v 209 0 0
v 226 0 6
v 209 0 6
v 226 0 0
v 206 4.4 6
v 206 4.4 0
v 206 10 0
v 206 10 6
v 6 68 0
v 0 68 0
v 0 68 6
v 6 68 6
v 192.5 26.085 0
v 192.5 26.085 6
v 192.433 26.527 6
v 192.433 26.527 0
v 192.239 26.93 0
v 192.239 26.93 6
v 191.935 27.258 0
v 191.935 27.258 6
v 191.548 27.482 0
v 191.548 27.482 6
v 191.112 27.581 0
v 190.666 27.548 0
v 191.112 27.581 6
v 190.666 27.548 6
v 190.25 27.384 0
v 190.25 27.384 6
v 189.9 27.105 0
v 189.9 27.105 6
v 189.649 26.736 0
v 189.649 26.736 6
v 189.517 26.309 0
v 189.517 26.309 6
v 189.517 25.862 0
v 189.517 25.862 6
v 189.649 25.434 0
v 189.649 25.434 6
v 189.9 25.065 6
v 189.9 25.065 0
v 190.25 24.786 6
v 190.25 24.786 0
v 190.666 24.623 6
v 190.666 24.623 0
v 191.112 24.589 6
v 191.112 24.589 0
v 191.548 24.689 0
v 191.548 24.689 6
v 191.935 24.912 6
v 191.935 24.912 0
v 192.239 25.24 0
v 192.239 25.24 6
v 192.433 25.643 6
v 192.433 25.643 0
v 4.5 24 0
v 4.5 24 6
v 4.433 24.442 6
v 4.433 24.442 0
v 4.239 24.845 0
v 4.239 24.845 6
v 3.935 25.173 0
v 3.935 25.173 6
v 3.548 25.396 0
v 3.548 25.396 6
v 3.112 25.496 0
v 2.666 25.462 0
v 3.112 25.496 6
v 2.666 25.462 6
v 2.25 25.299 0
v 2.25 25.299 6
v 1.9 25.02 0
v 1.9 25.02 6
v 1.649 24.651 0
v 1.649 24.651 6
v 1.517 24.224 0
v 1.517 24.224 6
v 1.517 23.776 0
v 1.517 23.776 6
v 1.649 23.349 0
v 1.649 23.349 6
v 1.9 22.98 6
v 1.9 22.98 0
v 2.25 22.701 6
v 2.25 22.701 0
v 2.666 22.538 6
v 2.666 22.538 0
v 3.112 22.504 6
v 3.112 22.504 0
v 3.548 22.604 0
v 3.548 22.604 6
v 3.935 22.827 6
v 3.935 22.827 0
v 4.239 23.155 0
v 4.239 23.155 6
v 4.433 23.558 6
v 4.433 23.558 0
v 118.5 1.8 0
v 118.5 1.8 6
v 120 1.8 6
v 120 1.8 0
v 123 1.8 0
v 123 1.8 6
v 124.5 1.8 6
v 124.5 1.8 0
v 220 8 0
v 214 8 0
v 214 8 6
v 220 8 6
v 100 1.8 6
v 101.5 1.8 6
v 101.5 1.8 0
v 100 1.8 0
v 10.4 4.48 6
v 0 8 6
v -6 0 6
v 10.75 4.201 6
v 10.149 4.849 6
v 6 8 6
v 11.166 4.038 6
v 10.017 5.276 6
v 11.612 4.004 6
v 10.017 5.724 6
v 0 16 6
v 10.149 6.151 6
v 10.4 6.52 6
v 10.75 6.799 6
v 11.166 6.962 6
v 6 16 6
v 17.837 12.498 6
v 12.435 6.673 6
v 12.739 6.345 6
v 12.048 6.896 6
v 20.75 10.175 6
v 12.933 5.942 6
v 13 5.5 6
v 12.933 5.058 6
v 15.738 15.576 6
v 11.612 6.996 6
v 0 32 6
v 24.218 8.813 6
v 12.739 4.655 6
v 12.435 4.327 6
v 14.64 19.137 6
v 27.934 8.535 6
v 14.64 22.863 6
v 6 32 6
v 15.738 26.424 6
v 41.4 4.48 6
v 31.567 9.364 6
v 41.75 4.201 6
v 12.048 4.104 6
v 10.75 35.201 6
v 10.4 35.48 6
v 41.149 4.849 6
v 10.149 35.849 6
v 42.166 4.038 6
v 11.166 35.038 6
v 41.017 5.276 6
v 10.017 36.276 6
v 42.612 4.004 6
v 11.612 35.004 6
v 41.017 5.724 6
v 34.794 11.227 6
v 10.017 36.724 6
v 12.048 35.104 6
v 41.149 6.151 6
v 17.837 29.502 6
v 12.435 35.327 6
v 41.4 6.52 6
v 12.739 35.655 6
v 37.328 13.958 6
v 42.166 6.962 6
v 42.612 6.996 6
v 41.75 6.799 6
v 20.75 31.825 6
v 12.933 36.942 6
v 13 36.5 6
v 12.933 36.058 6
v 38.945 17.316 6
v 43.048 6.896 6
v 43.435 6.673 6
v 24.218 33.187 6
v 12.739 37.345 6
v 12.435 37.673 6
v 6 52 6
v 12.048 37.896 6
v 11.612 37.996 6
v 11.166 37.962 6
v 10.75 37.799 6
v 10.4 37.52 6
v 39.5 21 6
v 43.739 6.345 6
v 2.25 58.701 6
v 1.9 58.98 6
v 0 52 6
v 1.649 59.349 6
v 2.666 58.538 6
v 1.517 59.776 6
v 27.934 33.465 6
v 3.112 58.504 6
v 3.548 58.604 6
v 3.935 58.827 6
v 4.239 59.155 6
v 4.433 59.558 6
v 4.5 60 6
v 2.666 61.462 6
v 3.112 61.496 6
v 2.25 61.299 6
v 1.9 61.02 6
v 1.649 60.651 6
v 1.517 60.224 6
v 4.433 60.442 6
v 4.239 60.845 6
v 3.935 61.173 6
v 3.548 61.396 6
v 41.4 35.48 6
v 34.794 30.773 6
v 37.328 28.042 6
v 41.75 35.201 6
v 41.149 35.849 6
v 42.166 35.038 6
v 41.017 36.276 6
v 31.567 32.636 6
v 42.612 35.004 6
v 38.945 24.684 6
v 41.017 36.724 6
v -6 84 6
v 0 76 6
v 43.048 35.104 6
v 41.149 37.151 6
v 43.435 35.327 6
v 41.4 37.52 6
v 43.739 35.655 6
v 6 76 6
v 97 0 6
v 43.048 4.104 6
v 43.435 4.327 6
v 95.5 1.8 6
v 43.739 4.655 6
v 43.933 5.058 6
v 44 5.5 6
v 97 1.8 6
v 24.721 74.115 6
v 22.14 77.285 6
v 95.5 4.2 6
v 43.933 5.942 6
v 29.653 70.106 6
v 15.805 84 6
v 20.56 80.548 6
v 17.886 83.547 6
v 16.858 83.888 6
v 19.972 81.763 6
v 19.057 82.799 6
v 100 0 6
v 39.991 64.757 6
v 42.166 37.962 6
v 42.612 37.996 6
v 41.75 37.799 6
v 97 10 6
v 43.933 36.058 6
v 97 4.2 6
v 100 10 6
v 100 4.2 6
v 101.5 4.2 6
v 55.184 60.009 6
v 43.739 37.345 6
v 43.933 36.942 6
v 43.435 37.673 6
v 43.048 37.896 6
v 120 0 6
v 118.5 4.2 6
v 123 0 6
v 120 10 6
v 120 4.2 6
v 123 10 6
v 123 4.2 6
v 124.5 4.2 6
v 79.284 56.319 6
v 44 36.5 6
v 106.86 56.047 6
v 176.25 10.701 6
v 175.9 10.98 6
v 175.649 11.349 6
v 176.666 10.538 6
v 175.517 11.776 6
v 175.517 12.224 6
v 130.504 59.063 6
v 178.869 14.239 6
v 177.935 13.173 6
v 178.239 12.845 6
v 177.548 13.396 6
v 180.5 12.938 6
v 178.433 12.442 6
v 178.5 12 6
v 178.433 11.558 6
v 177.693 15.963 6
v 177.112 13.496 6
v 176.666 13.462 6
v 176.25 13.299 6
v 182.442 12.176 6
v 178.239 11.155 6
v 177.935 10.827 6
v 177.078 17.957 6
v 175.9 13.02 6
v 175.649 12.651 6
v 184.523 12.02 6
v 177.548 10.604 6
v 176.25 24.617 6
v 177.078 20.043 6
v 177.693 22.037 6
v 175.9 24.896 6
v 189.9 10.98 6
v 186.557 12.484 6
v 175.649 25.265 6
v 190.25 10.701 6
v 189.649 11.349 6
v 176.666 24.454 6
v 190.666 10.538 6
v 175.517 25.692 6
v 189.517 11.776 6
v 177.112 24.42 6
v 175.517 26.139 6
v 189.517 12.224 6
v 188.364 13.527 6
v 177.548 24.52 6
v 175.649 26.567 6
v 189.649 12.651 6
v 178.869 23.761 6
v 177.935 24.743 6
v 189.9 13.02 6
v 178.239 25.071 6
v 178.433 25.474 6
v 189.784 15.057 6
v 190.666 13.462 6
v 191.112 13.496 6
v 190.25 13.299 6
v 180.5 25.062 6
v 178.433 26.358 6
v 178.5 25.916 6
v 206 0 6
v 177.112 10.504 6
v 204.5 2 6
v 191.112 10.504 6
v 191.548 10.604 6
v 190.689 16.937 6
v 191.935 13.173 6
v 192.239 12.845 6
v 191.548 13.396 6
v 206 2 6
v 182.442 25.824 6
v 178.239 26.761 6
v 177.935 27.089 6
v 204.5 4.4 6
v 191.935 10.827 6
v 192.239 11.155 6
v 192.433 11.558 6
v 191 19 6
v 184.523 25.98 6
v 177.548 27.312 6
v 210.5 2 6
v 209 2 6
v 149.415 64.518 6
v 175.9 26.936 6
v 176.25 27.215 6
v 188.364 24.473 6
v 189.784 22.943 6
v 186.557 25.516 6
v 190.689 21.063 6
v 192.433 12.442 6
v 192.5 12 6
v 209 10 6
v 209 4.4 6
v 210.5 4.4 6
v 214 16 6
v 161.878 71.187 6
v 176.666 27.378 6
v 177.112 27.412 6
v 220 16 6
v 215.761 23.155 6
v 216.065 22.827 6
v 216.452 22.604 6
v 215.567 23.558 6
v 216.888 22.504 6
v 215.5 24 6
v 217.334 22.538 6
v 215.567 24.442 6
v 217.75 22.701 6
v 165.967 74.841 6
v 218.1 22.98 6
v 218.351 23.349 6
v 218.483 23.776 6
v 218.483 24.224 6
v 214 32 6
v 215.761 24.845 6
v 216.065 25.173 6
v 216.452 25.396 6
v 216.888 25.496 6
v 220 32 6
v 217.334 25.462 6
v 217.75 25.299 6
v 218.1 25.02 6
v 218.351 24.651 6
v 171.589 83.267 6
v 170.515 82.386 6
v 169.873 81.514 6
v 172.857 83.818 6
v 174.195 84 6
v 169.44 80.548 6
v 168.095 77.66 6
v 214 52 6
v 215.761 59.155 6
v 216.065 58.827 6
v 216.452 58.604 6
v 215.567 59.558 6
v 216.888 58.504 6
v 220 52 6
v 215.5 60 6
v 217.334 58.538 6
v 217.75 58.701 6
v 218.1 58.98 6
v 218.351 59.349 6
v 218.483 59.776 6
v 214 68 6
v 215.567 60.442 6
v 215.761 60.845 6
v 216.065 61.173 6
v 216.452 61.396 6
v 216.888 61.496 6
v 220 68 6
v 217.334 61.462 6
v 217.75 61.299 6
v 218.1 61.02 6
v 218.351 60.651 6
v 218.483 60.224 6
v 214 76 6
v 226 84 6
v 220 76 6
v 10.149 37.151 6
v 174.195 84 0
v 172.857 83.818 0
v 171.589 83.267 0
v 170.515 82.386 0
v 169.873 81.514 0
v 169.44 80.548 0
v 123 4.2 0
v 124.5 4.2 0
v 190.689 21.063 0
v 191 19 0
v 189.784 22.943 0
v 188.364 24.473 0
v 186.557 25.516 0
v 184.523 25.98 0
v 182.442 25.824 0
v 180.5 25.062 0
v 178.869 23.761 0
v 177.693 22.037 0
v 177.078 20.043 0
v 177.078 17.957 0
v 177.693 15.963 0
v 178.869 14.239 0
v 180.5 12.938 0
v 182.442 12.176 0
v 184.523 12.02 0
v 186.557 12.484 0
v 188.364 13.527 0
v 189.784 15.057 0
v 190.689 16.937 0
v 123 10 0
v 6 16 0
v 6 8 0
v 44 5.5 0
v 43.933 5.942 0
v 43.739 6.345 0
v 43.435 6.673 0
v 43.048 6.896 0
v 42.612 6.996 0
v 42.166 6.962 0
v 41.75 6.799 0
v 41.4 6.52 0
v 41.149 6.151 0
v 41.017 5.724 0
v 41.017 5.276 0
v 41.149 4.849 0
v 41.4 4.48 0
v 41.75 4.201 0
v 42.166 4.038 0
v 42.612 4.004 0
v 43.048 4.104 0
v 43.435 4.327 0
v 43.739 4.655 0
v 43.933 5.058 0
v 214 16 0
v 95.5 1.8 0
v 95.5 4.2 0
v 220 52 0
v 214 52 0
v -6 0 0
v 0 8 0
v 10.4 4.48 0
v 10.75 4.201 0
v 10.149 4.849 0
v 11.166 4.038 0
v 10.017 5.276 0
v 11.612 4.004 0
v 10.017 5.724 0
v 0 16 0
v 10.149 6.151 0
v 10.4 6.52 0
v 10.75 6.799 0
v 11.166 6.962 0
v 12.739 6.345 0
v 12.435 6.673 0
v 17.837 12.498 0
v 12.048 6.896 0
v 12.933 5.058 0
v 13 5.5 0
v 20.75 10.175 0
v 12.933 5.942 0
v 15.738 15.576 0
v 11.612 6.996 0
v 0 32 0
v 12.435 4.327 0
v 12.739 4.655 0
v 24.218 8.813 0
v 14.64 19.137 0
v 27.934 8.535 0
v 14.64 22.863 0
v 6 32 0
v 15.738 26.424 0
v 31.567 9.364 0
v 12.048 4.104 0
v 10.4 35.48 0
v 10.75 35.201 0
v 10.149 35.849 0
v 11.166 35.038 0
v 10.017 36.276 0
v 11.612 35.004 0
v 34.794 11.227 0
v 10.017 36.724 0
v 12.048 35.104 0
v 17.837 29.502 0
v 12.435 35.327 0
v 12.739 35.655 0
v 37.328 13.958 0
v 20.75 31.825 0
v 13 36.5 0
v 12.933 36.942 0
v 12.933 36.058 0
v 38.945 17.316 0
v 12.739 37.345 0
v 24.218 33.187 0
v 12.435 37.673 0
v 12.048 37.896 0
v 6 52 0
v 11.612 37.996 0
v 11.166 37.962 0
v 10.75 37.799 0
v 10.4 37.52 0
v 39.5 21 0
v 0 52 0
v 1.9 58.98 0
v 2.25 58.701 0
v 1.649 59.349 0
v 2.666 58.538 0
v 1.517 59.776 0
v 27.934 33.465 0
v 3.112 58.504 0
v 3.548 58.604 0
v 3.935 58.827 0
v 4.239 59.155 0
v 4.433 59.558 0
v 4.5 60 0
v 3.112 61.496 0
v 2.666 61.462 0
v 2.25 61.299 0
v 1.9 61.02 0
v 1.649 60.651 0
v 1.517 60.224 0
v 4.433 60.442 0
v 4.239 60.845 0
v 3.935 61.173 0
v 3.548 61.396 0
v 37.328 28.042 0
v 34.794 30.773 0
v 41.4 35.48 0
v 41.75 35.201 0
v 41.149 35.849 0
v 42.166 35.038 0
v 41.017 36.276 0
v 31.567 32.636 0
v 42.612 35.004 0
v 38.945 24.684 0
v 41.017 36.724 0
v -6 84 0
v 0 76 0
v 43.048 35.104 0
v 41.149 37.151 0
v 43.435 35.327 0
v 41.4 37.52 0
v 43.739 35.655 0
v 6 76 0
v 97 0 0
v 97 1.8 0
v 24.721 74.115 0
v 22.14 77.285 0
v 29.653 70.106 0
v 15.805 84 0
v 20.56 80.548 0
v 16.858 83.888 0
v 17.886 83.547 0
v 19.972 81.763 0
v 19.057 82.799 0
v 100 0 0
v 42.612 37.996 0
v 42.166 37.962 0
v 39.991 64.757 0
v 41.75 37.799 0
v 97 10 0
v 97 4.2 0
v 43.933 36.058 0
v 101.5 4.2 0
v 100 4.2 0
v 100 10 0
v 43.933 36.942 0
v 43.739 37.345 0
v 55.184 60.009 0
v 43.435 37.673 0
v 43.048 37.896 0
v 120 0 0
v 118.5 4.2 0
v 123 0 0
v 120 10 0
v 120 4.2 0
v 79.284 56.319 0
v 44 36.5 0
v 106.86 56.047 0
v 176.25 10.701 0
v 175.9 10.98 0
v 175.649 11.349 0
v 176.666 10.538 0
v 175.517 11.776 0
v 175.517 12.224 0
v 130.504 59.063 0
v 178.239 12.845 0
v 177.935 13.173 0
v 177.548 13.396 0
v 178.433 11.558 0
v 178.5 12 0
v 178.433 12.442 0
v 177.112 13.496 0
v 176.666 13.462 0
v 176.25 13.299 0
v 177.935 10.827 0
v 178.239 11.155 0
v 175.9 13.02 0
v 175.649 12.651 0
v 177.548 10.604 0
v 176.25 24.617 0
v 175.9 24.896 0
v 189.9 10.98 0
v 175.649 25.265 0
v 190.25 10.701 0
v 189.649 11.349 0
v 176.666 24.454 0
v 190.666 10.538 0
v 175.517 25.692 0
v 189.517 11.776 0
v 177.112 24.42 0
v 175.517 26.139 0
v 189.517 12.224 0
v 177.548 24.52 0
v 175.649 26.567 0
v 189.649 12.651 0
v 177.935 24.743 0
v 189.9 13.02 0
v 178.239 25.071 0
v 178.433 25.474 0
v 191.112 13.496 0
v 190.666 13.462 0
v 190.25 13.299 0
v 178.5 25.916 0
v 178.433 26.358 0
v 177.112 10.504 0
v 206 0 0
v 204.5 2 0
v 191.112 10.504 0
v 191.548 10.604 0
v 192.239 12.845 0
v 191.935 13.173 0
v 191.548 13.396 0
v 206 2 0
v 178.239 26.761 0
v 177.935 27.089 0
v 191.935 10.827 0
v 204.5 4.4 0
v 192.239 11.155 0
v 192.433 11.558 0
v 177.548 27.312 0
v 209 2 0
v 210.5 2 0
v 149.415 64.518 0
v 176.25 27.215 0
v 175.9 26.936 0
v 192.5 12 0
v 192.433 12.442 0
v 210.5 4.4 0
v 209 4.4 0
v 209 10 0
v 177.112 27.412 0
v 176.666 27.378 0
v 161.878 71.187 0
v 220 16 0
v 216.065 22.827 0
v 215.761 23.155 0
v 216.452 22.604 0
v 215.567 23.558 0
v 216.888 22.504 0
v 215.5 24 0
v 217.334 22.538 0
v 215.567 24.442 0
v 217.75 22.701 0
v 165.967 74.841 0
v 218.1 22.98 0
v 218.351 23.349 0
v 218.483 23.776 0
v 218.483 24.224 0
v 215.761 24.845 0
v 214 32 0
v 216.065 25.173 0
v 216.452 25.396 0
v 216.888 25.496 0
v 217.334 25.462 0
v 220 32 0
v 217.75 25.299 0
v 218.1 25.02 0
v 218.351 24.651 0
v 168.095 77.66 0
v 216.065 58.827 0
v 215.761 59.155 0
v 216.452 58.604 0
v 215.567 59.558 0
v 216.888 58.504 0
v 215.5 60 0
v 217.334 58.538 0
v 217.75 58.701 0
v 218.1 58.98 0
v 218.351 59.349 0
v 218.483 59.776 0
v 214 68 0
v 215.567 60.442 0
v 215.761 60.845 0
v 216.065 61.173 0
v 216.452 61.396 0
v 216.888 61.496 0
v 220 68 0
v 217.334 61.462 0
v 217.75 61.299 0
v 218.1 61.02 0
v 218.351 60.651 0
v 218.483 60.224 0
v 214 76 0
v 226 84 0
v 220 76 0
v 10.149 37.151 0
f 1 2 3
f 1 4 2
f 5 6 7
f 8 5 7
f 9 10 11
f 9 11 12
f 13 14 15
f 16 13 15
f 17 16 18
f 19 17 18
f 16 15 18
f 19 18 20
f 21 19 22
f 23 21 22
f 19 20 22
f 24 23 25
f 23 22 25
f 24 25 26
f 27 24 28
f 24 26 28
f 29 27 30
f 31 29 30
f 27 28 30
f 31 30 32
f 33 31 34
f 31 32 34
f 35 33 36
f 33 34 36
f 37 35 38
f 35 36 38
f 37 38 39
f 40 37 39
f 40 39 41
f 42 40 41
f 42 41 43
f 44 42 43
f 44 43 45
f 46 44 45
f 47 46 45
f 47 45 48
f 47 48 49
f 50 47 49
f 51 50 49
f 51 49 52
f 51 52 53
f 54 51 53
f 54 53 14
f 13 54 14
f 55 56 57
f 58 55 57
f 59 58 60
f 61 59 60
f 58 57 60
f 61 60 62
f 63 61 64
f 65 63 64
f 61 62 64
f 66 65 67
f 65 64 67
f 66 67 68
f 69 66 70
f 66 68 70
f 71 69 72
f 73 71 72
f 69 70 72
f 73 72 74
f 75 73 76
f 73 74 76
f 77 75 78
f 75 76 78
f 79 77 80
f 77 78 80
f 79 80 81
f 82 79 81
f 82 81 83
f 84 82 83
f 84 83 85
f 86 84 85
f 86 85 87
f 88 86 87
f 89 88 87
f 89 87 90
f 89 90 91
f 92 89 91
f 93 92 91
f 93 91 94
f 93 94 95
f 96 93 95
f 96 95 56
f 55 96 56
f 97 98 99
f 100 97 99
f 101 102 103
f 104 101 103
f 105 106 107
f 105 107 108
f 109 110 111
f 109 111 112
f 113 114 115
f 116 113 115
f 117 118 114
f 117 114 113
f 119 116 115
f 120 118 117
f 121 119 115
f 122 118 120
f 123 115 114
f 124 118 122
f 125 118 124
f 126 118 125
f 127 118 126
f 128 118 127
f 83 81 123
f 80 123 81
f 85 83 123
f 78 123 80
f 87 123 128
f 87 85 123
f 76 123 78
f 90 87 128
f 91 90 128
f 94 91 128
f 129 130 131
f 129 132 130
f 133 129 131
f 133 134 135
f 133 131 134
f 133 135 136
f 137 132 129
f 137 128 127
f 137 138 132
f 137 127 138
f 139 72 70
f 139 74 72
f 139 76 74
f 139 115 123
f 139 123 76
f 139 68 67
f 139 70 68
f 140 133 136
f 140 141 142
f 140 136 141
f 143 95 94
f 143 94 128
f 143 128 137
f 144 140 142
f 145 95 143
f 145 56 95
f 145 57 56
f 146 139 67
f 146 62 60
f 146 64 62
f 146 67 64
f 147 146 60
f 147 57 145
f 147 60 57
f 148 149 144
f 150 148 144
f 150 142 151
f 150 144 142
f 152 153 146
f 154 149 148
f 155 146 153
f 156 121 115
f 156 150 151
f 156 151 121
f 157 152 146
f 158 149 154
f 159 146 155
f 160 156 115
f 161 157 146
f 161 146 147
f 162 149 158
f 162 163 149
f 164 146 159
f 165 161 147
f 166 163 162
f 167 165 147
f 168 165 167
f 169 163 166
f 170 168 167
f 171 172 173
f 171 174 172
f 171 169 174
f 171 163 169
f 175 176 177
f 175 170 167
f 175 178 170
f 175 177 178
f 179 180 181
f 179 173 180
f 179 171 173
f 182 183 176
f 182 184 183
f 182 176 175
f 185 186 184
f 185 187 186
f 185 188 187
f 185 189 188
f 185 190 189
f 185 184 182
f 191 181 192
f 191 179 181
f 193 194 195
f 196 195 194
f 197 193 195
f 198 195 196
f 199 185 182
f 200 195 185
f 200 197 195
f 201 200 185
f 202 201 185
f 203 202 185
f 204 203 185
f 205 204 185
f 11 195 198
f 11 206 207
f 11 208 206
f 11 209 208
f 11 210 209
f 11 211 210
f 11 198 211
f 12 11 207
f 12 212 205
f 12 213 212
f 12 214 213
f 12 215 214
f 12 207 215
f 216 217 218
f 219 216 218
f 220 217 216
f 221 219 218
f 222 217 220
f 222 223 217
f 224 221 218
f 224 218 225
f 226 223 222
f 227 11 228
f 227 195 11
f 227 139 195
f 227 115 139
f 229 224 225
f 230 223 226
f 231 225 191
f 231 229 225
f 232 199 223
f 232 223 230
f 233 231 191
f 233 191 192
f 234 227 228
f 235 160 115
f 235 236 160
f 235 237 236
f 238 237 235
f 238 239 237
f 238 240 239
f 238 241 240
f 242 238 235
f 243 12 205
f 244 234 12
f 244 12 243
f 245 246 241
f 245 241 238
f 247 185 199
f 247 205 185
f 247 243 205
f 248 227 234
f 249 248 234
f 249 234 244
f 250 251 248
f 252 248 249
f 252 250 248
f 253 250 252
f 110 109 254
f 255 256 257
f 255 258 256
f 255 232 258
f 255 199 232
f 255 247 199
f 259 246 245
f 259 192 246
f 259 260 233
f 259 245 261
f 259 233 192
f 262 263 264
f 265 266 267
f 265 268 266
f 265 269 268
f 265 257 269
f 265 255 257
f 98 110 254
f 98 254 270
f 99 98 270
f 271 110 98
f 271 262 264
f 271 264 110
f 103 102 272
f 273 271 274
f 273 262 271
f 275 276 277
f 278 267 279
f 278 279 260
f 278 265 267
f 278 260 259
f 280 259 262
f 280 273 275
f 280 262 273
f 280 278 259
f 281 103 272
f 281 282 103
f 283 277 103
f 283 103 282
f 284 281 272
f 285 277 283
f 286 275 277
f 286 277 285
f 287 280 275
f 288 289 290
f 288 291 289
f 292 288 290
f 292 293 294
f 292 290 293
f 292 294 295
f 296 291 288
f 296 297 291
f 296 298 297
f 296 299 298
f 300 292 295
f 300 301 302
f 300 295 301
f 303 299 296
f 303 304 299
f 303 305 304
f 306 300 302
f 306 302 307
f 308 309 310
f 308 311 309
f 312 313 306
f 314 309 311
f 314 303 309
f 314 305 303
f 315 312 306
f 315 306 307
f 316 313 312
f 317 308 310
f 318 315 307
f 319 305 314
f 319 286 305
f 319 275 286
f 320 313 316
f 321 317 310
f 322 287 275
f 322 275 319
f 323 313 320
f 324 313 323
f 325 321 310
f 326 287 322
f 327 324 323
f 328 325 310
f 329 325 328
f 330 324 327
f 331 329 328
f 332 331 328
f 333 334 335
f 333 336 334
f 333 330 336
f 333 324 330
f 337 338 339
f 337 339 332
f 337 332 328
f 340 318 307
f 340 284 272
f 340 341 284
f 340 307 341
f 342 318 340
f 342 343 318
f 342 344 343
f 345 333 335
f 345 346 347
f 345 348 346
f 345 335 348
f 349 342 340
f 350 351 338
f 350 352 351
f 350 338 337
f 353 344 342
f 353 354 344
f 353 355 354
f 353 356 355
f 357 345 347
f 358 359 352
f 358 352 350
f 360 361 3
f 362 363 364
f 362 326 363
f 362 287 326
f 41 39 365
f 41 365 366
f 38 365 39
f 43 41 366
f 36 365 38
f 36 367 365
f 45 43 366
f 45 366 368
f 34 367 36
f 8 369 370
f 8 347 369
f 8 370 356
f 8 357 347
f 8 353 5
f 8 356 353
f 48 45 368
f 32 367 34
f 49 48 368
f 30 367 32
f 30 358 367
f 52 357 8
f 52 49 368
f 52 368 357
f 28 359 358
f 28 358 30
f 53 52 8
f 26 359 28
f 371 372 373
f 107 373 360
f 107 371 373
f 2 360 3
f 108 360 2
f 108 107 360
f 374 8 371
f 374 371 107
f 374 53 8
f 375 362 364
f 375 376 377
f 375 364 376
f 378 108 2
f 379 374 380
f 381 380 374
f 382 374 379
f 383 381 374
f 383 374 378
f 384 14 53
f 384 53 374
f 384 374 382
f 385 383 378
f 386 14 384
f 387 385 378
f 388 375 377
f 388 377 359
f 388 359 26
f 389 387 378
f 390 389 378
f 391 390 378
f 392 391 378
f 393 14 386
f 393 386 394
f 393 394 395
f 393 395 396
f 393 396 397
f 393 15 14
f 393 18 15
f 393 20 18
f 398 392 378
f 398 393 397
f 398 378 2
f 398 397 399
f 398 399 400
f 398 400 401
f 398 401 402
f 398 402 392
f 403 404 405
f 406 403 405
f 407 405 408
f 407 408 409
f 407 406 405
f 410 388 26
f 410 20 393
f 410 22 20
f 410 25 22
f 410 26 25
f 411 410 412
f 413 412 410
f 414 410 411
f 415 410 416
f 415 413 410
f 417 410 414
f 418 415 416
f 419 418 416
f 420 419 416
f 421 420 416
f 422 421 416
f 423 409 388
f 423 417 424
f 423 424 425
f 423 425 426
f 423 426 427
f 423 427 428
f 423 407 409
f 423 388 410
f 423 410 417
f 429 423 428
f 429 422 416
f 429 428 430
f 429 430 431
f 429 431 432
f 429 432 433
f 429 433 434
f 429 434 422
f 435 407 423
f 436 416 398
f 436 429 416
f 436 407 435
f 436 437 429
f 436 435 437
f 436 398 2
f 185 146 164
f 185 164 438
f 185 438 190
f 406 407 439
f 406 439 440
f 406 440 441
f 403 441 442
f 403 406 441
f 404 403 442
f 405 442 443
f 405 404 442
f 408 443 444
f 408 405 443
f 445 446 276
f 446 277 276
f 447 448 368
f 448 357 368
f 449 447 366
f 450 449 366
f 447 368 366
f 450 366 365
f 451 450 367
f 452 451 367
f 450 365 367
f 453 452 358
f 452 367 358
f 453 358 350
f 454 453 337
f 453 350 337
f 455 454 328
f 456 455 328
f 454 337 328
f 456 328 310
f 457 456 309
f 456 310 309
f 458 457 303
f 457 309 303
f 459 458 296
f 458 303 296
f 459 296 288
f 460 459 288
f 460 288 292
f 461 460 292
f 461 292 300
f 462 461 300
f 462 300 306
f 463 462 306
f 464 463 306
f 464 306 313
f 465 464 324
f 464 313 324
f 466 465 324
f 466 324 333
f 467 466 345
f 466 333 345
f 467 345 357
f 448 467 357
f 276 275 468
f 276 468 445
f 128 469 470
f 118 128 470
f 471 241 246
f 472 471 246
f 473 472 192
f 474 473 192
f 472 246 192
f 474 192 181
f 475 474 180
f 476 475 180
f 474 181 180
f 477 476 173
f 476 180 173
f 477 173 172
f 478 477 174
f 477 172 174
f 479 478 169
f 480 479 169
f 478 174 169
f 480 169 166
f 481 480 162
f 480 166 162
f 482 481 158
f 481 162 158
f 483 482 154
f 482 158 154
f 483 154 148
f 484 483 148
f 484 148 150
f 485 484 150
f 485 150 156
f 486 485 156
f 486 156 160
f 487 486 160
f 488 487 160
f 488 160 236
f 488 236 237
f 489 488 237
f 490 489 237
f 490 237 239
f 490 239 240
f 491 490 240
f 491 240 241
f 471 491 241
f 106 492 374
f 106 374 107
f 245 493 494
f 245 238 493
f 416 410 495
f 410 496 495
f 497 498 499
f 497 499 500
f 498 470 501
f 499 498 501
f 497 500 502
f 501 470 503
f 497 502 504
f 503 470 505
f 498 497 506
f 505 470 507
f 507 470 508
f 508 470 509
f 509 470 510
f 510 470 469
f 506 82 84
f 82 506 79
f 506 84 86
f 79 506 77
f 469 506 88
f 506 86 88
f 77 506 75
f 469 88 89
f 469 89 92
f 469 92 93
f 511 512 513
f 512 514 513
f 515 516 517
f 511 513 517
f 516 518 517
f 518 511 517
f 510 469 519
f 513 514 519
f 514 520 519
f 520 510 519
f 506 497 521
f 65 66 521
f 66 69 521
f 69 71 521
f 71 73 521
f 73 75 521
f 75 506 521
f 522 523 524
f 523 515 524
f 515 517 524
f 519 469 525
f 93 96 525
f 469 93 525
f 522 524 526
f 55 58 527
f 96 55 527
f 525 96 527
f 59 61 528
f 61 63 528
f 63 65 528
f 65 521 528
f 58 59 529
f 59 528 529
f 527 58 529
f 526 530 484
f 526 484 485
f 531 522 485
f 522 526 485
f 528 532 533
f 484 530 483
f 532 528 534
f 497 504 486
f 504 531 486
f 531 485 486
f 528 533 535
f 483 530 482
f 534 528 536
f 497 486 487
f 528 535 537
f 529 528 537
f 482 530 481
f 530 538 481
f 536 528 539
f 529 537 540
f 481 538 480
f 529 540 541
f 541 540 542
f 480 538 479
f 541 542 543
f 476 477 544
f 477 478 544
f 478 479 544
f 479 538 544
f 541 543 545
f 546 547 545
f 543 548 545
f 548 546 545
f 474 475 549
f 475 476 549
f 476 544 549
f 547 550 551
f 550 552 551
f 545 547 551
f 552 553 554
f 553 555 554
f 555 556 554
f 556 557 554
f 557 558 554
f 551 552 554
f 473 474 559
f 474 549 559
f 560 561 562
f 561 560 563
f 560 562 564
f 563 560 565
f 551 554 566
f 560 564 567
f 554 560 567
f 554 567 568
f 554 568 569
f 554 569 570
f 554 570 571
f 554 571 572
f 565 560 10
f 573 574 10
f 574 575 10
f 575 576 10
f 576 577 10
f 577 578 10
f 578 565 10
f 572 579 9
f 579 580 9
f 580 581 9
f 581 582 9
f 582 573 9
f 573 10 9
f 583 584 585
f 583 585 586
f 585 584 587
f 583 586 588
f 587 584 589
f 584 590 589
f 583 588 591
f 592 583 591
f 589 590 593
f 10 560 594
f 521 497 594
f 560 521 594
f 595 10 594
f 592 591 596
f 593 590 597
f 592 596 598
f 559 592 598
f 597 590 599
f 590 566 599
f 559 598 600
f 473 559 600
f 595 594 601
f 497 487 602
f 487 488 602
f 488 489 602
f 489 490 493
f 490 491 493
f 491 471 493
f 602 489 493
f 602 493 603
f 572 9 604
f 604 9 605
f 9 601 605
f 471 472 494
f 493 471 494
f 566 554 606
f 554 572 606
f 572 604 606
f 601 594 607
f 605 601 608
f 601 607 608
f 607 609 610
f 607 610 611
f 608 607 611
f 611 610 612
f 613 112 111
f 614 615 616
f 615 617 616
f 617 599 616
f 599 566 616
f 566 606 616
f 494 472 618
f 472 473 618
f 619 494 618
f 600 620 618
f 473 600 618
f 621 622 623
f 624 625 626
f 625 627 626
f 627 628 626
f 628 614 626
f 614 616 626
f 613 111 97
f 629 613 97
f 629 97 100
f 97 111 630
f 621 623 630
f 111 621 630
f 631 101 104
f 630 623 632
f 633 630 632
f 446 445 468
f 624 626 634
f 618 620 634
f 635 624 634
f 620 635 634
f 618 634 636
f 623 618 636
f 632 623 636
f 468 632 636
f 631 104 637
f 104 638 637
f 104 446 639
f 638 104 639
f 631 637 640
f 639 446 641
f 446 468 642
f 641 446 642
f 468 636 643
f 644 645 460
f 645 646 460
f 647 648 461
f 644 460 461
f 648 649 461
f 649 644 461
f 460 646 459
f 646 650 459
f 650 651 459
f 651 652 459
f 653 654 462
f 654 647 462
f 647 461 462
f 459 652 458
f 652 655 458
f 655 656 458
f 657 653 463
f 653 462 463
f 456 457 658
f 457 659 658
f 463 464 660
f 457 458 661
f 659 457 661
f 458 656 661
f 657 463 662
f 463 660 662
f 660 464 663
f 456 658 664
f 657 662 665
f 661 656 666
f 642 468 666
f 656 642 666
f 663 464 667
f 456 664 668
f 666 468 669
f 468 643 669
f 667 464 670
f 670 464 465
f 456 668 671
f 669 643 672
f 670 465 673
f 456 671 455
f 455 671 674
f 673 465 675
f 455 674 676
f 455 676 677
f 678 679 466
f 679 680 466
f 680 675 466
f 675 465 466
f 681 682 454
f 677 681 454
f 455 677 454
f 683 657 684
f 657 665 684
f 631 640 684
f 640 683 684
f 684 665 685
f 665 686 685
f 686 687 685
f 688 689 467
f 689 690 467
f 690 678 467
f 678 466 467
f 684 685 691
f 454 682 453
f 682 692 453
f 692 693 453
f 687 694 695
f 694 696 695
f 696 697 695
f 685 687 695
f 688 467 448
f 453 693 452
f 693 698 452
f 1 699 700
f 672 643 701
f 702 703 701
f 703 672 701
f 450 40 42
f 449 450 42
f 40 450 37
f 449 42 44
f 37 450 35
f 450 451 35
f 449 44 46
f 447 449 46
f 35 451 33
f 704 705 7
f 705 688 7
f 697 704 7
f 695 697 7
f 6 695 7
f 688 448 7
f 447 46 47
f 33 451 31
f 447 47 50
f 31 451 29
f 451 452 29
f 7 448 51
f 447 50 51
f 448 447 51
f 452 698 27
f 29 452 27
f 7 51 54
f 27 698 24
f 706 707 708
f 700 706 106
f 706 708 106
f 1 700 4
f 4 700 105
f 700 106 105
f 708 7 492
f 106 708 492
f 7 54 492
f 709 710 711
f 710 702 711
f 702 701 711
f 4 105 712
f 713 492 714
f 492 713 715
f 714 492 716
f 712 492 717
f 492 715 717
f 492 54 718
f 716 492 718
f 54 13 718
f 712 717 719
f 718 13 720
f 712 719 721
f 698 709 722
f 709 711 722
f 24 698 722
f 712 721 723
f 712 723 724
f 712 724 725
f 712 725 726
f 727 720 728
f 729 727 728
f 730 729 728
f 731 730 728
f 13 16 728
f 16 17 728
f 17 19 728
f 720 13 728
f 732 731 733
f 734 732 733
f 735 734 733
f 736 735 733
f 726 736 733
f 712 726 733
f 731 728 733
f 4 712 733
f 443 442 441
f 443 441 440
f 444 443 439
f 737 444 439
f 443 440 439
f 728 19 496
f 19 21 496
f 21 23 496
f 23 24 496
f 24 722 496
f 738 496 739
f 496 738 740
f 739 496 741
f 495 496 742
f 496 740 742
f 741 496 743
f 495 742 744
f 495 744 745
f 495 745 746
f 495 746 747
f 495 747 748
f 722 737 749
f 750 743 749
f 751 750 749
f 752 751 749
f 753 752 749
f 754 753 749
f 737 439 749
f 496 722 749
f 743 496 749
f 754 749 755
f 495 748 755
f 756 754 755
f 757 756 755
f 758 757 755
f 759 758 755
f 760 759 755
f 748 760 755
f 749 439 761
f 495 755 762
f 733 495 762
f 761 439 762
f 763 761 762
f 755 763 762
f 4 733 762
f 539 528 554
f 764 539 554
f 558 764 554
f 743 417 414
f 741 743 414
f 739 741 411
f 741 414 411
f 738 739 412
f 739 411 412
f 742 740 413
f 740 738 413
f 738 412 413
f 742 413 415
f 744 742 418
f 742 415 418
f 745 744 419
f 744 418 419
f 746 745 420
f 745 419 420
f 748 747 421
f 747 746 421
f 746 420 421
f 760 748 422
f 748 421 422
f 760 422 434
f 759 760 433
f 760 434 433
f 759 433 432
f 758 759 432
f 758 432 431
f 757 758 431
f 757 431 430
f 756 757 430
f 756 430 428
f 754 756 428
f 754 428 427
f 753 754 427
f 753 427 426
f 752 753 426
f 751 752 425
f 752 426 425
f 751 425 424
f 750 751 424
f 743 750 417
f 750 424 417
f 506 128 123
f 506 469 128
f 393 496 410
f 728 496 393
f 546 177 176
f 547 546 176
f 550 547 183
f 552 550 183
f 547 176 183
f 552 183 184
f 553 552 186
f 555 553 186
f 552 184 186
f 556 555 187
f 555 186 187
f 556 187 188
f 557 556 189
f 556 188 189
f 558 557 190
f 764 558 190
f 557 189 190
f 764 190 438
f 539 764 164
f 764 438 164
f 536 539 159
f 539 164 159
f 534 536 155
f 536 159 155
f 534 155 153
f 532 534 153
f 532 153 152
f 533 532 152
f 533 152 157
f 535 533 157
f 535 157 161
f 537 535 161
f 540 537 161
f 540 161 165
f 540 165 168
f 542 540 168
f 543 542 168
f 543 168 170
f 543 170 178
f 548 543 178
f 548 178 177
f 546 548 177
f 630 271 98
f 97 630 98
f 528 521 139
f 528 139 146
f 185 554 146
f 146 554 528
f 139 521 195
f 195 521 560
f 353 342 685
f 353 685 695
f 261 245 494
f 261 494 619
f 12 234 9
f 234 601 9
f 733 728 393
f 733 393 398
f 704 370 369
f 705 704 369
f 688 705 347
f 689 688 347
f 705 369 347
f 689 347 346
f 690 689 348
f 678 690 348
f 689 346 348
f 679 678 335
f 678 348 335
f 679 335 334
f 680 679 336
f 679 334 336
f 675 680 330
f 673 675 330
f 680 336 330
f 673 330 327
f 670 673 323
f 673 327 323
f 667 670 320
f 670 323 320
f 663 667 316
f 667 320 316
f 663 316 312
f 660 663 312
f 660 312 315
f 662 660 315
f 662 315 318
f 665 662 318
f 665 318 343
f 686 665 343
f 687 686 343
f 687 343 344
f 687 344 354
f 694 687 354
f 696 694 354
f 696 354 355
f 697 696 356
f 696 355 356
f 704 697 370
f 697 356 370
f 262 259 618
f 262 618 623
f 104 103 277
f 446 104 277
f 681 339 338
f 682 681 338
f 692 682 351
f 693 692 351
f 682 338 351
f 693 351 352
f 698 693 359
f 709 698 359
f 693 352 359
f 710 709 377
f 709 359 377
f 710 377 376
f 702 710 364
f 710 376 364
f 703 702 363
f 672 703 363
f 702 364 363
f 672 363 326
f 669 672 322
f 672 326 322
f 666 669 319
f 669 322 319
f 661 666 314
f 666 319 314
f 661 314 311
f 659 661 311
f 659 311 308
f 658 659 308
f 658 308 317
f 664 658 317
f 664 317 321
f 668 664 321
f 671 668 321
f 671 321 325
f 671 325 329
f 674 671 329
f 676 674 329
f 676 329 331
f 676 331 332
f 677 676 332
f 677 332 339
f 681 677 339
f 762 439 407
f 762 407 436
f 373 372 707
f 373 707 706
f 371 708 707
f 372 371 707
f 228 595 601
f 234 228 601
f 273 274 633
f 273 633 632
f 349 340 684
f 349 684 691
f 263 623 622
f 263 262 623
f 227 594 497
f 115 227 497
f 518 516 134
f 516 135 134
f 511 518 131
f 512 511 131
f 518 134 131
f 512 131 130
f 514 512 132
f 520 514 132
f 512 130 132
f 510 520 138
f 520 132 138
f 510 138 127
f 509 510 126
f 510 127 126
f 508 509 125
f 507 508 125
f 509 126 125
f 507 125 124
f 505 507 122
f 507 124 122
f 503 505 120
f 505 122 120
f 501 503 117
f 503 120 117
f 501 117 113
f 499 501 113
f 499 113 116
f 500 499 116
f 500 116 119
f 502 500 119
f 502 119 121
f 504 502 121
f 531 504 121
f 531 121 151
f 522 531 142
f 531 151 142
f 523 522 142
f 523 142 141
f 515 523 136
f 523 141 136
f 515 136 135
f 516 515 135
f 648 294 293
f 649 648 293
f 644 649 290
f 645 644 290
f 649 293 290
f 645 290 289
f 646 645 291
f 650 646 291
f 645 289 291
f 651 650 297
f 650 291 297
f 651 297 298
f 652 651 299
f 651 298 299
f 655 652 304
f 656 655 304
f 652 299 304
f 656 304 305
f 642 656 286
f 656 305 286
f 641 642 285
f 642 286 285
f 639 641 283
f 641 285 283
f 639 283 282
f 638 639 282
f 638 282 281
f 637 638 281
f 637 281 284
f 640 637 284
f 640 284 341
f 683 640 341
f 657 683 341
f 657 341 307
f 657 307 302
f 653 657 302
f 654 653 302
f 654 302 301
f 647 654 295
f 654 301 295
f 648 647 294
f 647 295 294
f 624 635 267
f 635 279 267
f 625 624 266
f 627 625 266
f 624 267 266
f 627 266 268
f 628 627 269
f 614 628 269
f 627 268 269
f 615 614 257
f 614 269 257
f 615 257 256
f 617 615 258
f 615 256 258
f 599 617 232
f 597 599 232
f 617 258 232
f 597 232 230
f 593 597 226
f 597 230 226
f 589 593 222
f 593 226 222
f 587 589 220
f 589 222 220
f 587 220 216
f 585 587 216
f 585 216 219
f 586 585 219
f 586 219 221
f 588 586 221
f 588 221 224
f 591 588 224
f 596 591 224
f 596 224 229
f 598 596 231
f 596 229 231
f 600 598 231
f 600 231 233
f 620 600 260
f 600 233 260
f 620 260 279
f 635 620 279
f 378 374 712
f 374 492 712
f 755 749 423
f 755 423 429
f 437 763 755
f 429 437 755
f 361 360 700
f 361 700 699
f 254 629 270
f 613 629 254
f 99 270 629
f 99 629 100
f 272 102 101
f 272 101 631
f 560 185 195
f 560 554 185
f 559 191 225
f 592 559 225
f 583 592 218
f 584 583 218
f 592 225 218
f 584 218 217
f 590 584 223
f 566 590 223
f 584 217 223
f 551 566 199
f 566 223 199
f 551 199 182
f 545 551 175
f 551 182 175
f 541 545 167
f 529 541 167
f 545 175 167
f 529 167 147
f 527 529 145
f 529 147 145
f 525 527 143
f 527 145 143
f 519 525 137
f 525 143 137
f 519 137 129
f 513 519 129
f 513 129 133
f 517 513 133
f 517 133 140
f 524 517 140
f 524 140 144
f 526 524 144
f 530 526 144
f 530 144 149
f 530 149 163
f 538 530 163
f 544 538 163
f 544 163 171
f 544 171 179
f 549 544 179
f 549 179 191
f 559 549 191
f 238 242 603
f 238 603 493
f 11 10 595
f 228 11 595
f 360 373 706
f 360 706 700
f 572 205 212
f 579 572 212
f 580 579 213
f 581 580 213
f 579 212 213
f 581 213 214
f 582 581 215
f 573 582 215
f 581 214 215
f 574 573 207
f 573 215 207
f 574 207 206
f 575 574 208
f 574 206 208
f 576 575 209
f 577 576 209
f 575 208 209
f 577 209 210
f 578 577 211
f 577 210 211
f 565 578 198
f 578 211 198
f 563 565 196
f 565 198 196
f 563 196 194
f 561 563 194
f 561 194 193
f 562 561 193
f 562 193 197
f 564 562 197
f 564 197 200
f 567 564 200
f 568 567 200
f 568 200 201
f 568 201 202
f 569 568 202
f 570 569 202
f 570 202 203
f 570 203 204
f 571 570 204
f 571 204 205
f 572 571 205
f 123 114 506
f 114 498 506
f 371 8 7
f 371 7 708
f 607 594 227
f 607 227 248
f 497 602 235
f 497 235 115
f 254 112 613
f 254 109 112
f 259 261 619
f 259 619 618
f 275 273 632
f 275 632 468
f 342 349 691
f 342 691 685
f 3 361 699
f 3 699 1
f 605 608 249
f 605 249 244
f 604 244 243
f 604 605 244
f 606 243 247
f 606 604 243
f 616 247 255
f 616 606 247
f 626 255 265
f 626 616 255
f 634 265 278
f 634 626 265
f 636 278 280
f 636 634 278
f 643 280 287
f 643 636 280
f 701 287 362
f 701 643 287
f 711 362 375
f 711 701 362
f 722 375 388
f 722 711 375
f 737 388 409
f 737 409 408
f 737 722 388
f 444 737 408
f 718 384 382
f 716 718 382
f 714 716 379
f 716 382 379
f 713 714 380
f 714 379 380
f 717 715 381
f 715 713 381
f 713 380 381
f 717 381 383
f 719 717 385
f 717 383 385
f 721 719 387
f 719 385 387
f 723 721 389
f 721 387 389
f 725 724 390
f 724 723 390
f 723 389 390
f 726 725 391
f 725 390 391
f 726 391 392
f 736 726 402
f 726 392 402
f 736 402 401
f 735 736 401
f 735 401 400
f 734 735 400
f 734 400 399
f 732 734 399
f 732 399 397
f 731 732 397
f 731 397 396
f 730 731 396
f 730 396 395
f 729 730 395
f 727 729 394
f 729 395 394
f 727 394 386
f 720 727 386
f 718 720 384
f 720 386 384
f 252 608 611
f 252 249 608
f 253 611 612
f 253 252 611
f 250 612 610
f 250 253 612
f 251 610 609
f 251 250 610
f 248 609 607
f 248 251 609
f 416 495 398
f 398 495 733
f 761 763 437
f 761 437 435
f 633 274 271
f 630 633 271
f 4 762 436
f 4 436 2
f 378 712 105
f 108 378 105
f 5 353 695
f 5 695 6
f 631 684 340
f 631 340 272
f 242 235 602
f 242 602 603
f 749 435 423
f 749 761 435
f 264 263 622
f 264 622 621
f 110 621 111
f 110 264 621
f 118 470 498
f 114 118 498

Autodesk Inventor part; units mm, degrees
ref_plane "YZ Plane" through (0, 0, 0) normal (1, 0, 0) x (0, 1, 0)
ref_plane "XZ Plane" through (0, 0, 0) normal (0, 1, 0) x (-1, 0, 0)
ref_plane "XY Plane" through (0, 0, 0) normal (0, 0, 1) x (1, 0, 0)
sketch "Эскиз1" plane through (0, 0, 0) normal (0, 0, 1) x (1, 0, 0)
  line L0 (220, 84) -> (220, 0)
  line L1 (220, 0) -> (0, 0)
  line L2 (0, 0) -> (0, 84)
  line L3 (6, 0) -> (0, 0)
  line L4 (0, 76) -> (6, 76)
  line L5 (6, 76) -> (6, 8)
  line L6 (6, 8) -> (0, 8)
  line L7 (0, 8) -> (0, 76)
  ellipse E0 centre (95, 84) end of major axis (170, 84) minor radius 28.3094 (20, 84) -> (170, 84) ccw
  line L8 (0, 84) -> (20, 84)
  line L9 (170, 84) -> (220, 84)
  line L10 (220, 76) -> (214, 76)
  line L11 (214, 76) -> (214, 8)
  line L12 (214, 8) -> (220, 8)
  line L13 (220, 8) -> (220, 76)
  line L14 (0, 68) -> (6, 68)
  line L15 (6, 68) -> (6, 52)
  line L16 (6, 52) -> (0, 52)
  line L17 (0, 52) -> (0, 68)
  line L18 (0, 32) -> (6, 32)
  line L19 (6, 32) -> (6, 16)
  line L20 (6, 16) -> (0, 16)
  line L21 (0, 16) -> (0, 32)
  line L22 (214, 68) -> (220, 68)
  line L23 (214, 52) -> (220, 52)
  line L24 (214, 32) -> (220, 32)
  line L25 (214, 16) -> (220, 16)
  line L26 (0, 84) -> (-6, 84)
  line L27 (-6, 84) -> (-6, 0)
  line L28 (-6, 0) -> (0, 0)
  line L29 (0, 0) -> (0, 84)
  line L30 (220, 84) -> (226, 84)
  line L31 (226, 84) -> (226, 0)
  line L32 (226, 0) -> (220, 0)
  line L33 (220, 0) -> (220, 84)
  point P0 (217, 8)
  point P1 (220, 8)
  point P2 (3, 76)
  point P3 (3, 0)
  point P4 (217, 76)
  point P5 (3, 68)
  point P6 (0, 16)
  point P7 (0, 52)
  point P8 (217, 68)
  point P9 (217, 32)
  point P10 (217, 16)
  point P11 (217, 52)
  point P12 (220, 32)
  point P13 (220, 52)
  point P14 (220, 68)
  dimension "d1" = 75
  dimension "d0" = 220
  dimension "d2" = 125
  dimension "d3" = 84
  dimension "d4" = 150
  dimension "d5" = 84
  dimension "d6" = 6
  dimension "d7" = 8
  dimension "d10" = 6
  dimension "d11" = 8
  dimension "d12" = 8
  dimension "d13" = 8
  dimension "d14" = 84
  dimension "d35" = 8
  dimension "d36" = 8
  dimension "d37" = 16
  dimension "d38" = 16
  dimension "d39" = 8
  dimension "d40" = 8
  dimension "d41" = 16
  dimension "d42" = 16
  dimension "d96" = 6
  dimension "d97" = 6
extrude "Выдавливание1" add sketch "Эскиз1" along normal blind 6 contours L30 L31 L32 L0 | L0 L10 L11 L12 L1 L2 L6 L5 L4 L8 E0 L9 | L0 L23 L11 L22 | L2 L28 L27 L26 | L0 L25 L11 L24 | L14 L5 L16 L2 | L18 L5 L20 L2
sketch "Эскиз2" plane through (0, 0, 6) normal (0, 0, 1) x (1, 0, 0)
  line L0 (0, 0) -> (220, 0) projected
  line L1 (6, 0) -> (48, 0)
  line L2 (48, 0) -> (48, 8)
  line L3 (48, 8) -> (6, 8)
  line L4 (6, 8) -> (6, 0)
  line L5 (48, 0) -> (40, 0)
  line L6 (40, 0) -> (40, 42)
  line L7 (40, 42) -> (48, 42)
  line L8 (48, 42) -> (48, 0)
  line L9 (48, 42) -> (6, 42)
  line L10 (6, 42) -> (6, 34)
  line L11 (6, 34) -> (48, 34)
  line L12 (48, 34) -> (48, 42)
  line L13 (6, 42) -> (14, 42)
  line L14 (14, 42) -> (14, 0)
  line L15 (14, 0) -> (6, 0)
  line L16 (6, 0) -> (6, 42)
  line L17 (6, 16) -> (6, 8) projected
  circle A0 centre (11.5, 36.5) radius 1.5
  circle A1 centre (42.5, 36.5) radius 1.5
  circle A2 centre (42.5, 5.5) radius 1.5
  circle A3 centre (11.5, 5.5) radius 1.5
  circle A4 centre (184, 19) radius 7
  circle A5 centre (177, 25.9159) radius 1.5
  circle A6 centre (191, 26.0852) radius 1.5
  circle A7 centre (191, 12) radius 1.5
  circle A8 centre (177, 12) radius 1.5
  line L18 (177, 42.7055) -> (177, 0) construction
  line L19 (173.1146, 12) -> (210.5161, 12) construction
  line L20 (0, 0) -> (220, 0) projected
  line L21 (174.3072, 25.8833) -> (201.7049, 26.2146) construction
  line L22 (191, 29.1476) -> (191, 5.5) construction
  line L23 (214, 8) -> (214, 16) projected
  circle A9 centre (27, 21) radius 12.5
  point P0 (27, 0)
  point P1 (6, 76)
  point P2 (14, 34)
  point P3 (14, 8)
  point P4 (40, 8)
  point P5 (40, 34)
  dimension "d15" = 42
  dimension "d16" = 42
  dimension "d17" = 8
  dimension "d18" = 8
  dimension "d19" = 8
  dimension "d20" = 8
  dimension "d21" = 3
  dimension "d22" = 3
  dimension "d23" = 3
  dimension "d24" = 3
  dimension "d25" = 5.5
  dimension "d26" = 5.5
  dimension "d27" = 5.5
  dimension "d28" = 5.5
  dimension "d29" = 5.5
  dimension "d30" = 5.5
  dimension "d31" = 5.5
  dimension "d32" = 5.5
  dimension "d78" = 14
  dimension "d80" = 3
  dimension "d81" = 3
  dimension "d82" = 3
  dimension "d83" = 3
  dimension "d91" = 30
  dimension "d93" = 21
  dimension "d94" = 21
  dimension "d95" = 25
extrude "Выдавливание2" cut sketch "Эскиз2" against normal blind 6 contours A0 | A1 | A2 | A3 | A4 | A5 | A6 | A7 | A8 | A9
ref_plane "РабПлоскость1" through (110, 8, 0) normal (-1, 0, 0) x (0, 0, 1)
sketch "Эскиз5" plane through (0, 0, 0) normal (0, -1, 0) x (1, 0, 0)
  circle A0 centre (115, 3) radius 1.5
  circle A1 centre (105, 3) radius 1.5
  line L0 (110, -1.2) -> (110, 7.2) projected
  line L1 (0, 0) -> (220, 0) projected
  dimension "d70" = 5
  dimension "d71" = 5
  dimension "d72" = 3
  dimension "d73" = 3
  dimension "d74" = 3
  dimension "d75" = 3
extrude "Выдавливание3" [suppressed]
fillet "Сопряжение1" radius 5 2 edges at (170, 84, 3) (20, 84, 3)
sketch "Эскиз6" plane through (0, 0, 6) normal (0, 0, 1) x (1, 0, 0)
  line L0 (-6, 0) -> (226, 0) projected
  line L1 (100, 0) -> (97, 0)
  line L2 (97, 0) -> (97, 10)
  line L3 (97, 10) -> (100, 10)
  line L4 (100, 10) -> (100, 0)
  line L5 (123, 0) -> (120, 0)
  line L6 (120, 0) -> (120, 10)
  line L7 (120, 10) -> (123, 10)
  line L8 (123, 10) -> (123, 0)
  line L9 (124.5, 4.2) -> (118.5, 4.2)
  line L10 (118.5, 4.2) -> (118.5, 1.8)
  line L11 (118.5, 1.8) -> (124.5, 1.8)
  line L12 (124.5, 1.8) -> (124.5, 4.2)
  line L13 (95.5, 4.2) -> (101.5, 4.2)
  line L14 (101.5, 4.2) -> (101.5, 1.8)
  line L15 (101.5, 1.8) -> (95.5, 1.8)
  line L16 (95.5, 1.8) -> (95.5, 4.2)
  line L17 (110, -16.8) -> (110, 100.8) projected
  point P0 (0, 0)
  point P1 (120, 1.8)
  point P2 (120, 0)
  point P3 (123, 1.8)
  point P4 (123, 4.2)
  point P5 (120, 4.2)
  point P6 (97, 1.8)
  point P7 (97, 0)
  point P8 (100, 1.8)
  point P9 (100, 4.2)
  point P10 (97, 4.2)
  dimension "d98" = 10
  dimension "d99" = 10
  dimension "d100" = 13
  dimension "d101" = 3
  dimension "d102" = 3
  dimension "d103" = 10
  dimension "d104" = 6
  dimension "d105" = 8.5
  dimension "d106" = 2.4
  dimension "d107" = 1.8
  dimension "d108" = 2.4
  dimension "d109" = 6
  dimension "d110" = 8.5
extrude "Выдавливание4" cut sketch "Эскиз6" against normal blind 6
sketch "Эскиз7" plane through (0, 0, 6) normal (0, 0, 1) x (1, 0, 0)
  circle A0 centre (3, 60) radius 1.5
  circle A1 centre (3, 24) radius 1.5
  line L0 (6, 68) -> (0, 68) projected
  line L1 (6, 76) -> (6, 68) construction
  line L2 (0, 52) -> (6, 52) construction
  line L3 (6, 68) -> (6, 52) construction
  line L4 (6, 32) -> (0, 32) construction
  point P0 (0, 0)
  point P1 (3, 68)
  point P2 (3, 32)
  dimension "d113" = 3
  dimension "d114" = 3
  dimension "d115" = 8
  dimension "d116" = 3
  dimension "d118" = 8
  dimension "d119" = 3
extrude "Выдавливание5" cut sketch "Эскиз7" against normal blind 6
mirror "Зеркальное отражение2" about plane through (110, 8, 0) normal (-1, 0, 0) of "Выдавливание5"
sketch "Эскиз8" plane through (0, 0, 6) normal (0, 0, 1) x (1, 0, 0)
  circle A0 centre (217, 24) radius 1.5 projected
  circle A1 centre (217, 60) radius 1.5 projected
  circle A2 centre (3, 24) radius 1.5 projected
  circle A3 centre (3, 60) radius 1.5 projected
  line L0 (0, 8) -> (0, 16) projected
  line L1 (0, 16) -> (6, 16) projected
  line L2 (6, 16) -> (6, 8) projected
  line L3 (6, 8) -> (0, 8) projected
  line L4 (0, 32) -> (0, 52) projected
  line L5 (0, 52) -> (6, 52) projected
  line L6 (6, 52) -> (6, 32) projected
  line L7 (6, 32) -> (0, 32) projected
  line L8 (0, 68) -> (0, 76) projected
  line L9 (0, 76) -> (6, 76) projected
  line L10 (6, 76) -> (6, 68) projected
  line L11 (6, 68) -> (0, 68) projected
  line L12 (220, 76) -> (220, 68) projected
  line L13 (220, 68) -> (214, 68) projected
  line L14 (214, 68) -> (214, 76) projected
  line L15 (214, 76) -> (220, 76) projected
  line L16 (220, 52) -> (220, 32) projected
  line L17 (220, 32) -> (214, 32) projected
  line L18 (214, 32) -> (214, 52) projected
  line L19 (214, 52) -> (220, 52) projected
  line L20 (220, 16) -> (220, 8) projected
  line L21 (220, 8) -> (214, 8) projected
  line L22 (214, 8) -> (214, 16) projected
  line L23 (214, 16) -> (220, 16) projected
  circle A4 centre (27, 21) radius 12.5 projected
  circle A5 centre (177, 12) radius 1.5 projected
  circle A6 centre (42.5, 5.5) radius 1.5 projected
  circle A7 centre (42.5, 36.5) radius 1.5 projected
  circle A8 centre (177, 25.9159) radius 1.5 projected
  circle A9 centre (184, 19) radius 7 projected
  circle A10 centre (191, 12) radius 1.5 projected
  circle A11 centre (11.5, 5.5) radius 1.5 projected
  circle A12 centre (11.5, 36.5) radius 1.5 projected
  circle A13 centre (191, 26.0852) radius 1.5 projected
  line L24 (120, 0) -> (120, 1.8) projected
  line L25 (120, 1.8) -> (118.5, 1.8) projected
  line L26 (118.5, 1.8) -> (118.5, 4.2) projected
  line L27 (118.5, 4.2) -> (120, 4.2) projected
  line L28 (120, 4.2) -> (120, 10) projected
  line L29 (120, 10) -> (123, 10) projected
  line L30 (123, 10) -> (123, 4.2) projected
  line L31 (123, 4.2) -> (124.5, 4.2) projected
  line L32 (124.5, 4.2) -> (124.5, 1.8) projected
  line L33 (124.5, 1.8) -> (123, 1.8) projected
  line L34 (123, 1.8) -> (123, 0) projected
  line L35 (123, 0) -> (226, 0) projected
  line L36 (226, 0) -> (226, 84) projected
  line L37 (226, 84) -> (174.1947, 84) projected
  arc A14 (174.1947, 84) -> (169.4402, 80.5476) centre (174.1947, 79) ccw projected
  ellipse E0 centre (95, 84) end of major axis (20, 84) minor radius 28.3094 (20.5598, 80.5476) -> (169.4402, 80.5476) ccw projected
  arc A15 (20.5598, 80.5476) -> (15.8053, 84) centre (15.8053, 79) ccw projected
  line L38 (15.8053, 84) -> (-6, 84) projected
  line L39 (-6, 84) -> (-6, 0) projected
  line L40 (-6, 0) -> (97, 0) projected
  line L41 (97, 0) -> (97, 1.8) projected
  line L42 (97, 1.8) -> (95.5, 1.8) projected
  line L43 (95.5, 1.8) -> (95.5, 4.2) projected
  line L44 (95.5, 4.2) -> (97, 4.2) projected
  line L45 (97, 4.2) -> (97, 10) projected
  line L46 (97, 10) -> (100, 10) projected
  line L47 (100, 10) -> (100, 4.2) projected
  line L48 (100, 4.2) -> (101.5, 4.2) projected
  line L49 (101.5, 4.2) -> (101.5, 1.8) projected
  line L50 (101.5, 1.8) -> (100, 1.8) projected
  line L51 (100, 1.8) -> (100, 0) projected
  line L52 (100, 0) -> (120, 0) projected
  line L53 (214, 58.5) -> (220, 58.5)
  line L54 (220, 58.5) -> (220, 52)
  line L55 (214, 52) -> (220, 52)
  line L56 (214, 32) -> (214, 52)
  line L57 (220, 32) -> (214, 32)
  line L58 (220, 32) -> (220, 25.5)
  line L59 (220, 25.5) -> (214, 25.5)
  line L60 (214, 25.5) -> (214, 32)
  line L61 (214, 52) -> (214, 58.5)
  line L62 (220, 52) -> (220, 32)
  line L63 (220, 61.5) -> (214, 61.5)
  line L64 (214, 61.5) -> (214, 68)
  line L65 (214, 68) -> (214, 76)
  line L66 (214, 76) -> (214, 84)
  line L67 (214, 84) -> (220, 84)
  line L68 (220, 84) -> (220, 76)
  line L69 (220, 76) -> (220, 68)
  line L70 (220, 68) -> (220, 61.5)
  line L71 (220, 68) -> (214, 68)
  line L72 (214, 76) -> (220, 76)
  line L73 (214, -6) -> (214, 8)
  line L74 (214, 8) -> (214, 16)
  line L75 (214, 16) -> (214, 22.5)
  line L76 (214, 22.5) -> (220, 22.5)
  line L77 (220, 22.5) -> (220, 16)
  line L78 (220, 16) -> (220, 8)
  line L79 (220, 8) -> (220, -6)
  line L80 (220, -6) -> (214, -6)
  line L81 (220, 8) -> (214, 8)
  line L82 (214, 16) -> (220, 16)
  line L83 (209, 0) -> (206, 0)
  line L84 (206, 0) -> (206, 10)
  line L85 (206, 10) -> (209, 10)
  line L86 (209, 10) -> (209, 0)
  line L87 (204.5, 4.4) -> (210.5, 4.4)
  line L88 (210.5, 4.4) -> (210.5, 2)
  line L89 (210.5, 2) -> (204.5, 2)
  line L90 (204.5, 2) -> (204.5, 4.4)
  point P0 (0, 0)
  point P1 (204.5, 3.2)
  point P2 (207.5, 0)
  point P3 (206, 4.4)
  point P4 (206, 2)
  point P5 (209, 2)
  point P6 (209, 4.4)
  dimension "d122" = 5
  dimension "d123" = 3
  dimension "d124" = 2.4
  dimension "d125" = 6
  dimension "d126" = 1.5
  dimension "d127" = 2
  dimension "d128" = 10
extrude "Выдавливание6" cut sketch "Эскиз8" against normal through all contours L35 L84 L89 L86 | L89 L84 L87 L86 | L86 L87 L88 L89 | L89 L90 L87 L84 | L87 L84 L85 L86
equation "\"d36\" = d35"
equation "\"d38\" = d37"
equation "\"d40\" = d39"
equation "\"d42\" = d41"
equation "\"d22\" = d21"
equation "\"d23\" = d21"
equation "\"d24\" = d21"
properties part number "боковая стенка"
